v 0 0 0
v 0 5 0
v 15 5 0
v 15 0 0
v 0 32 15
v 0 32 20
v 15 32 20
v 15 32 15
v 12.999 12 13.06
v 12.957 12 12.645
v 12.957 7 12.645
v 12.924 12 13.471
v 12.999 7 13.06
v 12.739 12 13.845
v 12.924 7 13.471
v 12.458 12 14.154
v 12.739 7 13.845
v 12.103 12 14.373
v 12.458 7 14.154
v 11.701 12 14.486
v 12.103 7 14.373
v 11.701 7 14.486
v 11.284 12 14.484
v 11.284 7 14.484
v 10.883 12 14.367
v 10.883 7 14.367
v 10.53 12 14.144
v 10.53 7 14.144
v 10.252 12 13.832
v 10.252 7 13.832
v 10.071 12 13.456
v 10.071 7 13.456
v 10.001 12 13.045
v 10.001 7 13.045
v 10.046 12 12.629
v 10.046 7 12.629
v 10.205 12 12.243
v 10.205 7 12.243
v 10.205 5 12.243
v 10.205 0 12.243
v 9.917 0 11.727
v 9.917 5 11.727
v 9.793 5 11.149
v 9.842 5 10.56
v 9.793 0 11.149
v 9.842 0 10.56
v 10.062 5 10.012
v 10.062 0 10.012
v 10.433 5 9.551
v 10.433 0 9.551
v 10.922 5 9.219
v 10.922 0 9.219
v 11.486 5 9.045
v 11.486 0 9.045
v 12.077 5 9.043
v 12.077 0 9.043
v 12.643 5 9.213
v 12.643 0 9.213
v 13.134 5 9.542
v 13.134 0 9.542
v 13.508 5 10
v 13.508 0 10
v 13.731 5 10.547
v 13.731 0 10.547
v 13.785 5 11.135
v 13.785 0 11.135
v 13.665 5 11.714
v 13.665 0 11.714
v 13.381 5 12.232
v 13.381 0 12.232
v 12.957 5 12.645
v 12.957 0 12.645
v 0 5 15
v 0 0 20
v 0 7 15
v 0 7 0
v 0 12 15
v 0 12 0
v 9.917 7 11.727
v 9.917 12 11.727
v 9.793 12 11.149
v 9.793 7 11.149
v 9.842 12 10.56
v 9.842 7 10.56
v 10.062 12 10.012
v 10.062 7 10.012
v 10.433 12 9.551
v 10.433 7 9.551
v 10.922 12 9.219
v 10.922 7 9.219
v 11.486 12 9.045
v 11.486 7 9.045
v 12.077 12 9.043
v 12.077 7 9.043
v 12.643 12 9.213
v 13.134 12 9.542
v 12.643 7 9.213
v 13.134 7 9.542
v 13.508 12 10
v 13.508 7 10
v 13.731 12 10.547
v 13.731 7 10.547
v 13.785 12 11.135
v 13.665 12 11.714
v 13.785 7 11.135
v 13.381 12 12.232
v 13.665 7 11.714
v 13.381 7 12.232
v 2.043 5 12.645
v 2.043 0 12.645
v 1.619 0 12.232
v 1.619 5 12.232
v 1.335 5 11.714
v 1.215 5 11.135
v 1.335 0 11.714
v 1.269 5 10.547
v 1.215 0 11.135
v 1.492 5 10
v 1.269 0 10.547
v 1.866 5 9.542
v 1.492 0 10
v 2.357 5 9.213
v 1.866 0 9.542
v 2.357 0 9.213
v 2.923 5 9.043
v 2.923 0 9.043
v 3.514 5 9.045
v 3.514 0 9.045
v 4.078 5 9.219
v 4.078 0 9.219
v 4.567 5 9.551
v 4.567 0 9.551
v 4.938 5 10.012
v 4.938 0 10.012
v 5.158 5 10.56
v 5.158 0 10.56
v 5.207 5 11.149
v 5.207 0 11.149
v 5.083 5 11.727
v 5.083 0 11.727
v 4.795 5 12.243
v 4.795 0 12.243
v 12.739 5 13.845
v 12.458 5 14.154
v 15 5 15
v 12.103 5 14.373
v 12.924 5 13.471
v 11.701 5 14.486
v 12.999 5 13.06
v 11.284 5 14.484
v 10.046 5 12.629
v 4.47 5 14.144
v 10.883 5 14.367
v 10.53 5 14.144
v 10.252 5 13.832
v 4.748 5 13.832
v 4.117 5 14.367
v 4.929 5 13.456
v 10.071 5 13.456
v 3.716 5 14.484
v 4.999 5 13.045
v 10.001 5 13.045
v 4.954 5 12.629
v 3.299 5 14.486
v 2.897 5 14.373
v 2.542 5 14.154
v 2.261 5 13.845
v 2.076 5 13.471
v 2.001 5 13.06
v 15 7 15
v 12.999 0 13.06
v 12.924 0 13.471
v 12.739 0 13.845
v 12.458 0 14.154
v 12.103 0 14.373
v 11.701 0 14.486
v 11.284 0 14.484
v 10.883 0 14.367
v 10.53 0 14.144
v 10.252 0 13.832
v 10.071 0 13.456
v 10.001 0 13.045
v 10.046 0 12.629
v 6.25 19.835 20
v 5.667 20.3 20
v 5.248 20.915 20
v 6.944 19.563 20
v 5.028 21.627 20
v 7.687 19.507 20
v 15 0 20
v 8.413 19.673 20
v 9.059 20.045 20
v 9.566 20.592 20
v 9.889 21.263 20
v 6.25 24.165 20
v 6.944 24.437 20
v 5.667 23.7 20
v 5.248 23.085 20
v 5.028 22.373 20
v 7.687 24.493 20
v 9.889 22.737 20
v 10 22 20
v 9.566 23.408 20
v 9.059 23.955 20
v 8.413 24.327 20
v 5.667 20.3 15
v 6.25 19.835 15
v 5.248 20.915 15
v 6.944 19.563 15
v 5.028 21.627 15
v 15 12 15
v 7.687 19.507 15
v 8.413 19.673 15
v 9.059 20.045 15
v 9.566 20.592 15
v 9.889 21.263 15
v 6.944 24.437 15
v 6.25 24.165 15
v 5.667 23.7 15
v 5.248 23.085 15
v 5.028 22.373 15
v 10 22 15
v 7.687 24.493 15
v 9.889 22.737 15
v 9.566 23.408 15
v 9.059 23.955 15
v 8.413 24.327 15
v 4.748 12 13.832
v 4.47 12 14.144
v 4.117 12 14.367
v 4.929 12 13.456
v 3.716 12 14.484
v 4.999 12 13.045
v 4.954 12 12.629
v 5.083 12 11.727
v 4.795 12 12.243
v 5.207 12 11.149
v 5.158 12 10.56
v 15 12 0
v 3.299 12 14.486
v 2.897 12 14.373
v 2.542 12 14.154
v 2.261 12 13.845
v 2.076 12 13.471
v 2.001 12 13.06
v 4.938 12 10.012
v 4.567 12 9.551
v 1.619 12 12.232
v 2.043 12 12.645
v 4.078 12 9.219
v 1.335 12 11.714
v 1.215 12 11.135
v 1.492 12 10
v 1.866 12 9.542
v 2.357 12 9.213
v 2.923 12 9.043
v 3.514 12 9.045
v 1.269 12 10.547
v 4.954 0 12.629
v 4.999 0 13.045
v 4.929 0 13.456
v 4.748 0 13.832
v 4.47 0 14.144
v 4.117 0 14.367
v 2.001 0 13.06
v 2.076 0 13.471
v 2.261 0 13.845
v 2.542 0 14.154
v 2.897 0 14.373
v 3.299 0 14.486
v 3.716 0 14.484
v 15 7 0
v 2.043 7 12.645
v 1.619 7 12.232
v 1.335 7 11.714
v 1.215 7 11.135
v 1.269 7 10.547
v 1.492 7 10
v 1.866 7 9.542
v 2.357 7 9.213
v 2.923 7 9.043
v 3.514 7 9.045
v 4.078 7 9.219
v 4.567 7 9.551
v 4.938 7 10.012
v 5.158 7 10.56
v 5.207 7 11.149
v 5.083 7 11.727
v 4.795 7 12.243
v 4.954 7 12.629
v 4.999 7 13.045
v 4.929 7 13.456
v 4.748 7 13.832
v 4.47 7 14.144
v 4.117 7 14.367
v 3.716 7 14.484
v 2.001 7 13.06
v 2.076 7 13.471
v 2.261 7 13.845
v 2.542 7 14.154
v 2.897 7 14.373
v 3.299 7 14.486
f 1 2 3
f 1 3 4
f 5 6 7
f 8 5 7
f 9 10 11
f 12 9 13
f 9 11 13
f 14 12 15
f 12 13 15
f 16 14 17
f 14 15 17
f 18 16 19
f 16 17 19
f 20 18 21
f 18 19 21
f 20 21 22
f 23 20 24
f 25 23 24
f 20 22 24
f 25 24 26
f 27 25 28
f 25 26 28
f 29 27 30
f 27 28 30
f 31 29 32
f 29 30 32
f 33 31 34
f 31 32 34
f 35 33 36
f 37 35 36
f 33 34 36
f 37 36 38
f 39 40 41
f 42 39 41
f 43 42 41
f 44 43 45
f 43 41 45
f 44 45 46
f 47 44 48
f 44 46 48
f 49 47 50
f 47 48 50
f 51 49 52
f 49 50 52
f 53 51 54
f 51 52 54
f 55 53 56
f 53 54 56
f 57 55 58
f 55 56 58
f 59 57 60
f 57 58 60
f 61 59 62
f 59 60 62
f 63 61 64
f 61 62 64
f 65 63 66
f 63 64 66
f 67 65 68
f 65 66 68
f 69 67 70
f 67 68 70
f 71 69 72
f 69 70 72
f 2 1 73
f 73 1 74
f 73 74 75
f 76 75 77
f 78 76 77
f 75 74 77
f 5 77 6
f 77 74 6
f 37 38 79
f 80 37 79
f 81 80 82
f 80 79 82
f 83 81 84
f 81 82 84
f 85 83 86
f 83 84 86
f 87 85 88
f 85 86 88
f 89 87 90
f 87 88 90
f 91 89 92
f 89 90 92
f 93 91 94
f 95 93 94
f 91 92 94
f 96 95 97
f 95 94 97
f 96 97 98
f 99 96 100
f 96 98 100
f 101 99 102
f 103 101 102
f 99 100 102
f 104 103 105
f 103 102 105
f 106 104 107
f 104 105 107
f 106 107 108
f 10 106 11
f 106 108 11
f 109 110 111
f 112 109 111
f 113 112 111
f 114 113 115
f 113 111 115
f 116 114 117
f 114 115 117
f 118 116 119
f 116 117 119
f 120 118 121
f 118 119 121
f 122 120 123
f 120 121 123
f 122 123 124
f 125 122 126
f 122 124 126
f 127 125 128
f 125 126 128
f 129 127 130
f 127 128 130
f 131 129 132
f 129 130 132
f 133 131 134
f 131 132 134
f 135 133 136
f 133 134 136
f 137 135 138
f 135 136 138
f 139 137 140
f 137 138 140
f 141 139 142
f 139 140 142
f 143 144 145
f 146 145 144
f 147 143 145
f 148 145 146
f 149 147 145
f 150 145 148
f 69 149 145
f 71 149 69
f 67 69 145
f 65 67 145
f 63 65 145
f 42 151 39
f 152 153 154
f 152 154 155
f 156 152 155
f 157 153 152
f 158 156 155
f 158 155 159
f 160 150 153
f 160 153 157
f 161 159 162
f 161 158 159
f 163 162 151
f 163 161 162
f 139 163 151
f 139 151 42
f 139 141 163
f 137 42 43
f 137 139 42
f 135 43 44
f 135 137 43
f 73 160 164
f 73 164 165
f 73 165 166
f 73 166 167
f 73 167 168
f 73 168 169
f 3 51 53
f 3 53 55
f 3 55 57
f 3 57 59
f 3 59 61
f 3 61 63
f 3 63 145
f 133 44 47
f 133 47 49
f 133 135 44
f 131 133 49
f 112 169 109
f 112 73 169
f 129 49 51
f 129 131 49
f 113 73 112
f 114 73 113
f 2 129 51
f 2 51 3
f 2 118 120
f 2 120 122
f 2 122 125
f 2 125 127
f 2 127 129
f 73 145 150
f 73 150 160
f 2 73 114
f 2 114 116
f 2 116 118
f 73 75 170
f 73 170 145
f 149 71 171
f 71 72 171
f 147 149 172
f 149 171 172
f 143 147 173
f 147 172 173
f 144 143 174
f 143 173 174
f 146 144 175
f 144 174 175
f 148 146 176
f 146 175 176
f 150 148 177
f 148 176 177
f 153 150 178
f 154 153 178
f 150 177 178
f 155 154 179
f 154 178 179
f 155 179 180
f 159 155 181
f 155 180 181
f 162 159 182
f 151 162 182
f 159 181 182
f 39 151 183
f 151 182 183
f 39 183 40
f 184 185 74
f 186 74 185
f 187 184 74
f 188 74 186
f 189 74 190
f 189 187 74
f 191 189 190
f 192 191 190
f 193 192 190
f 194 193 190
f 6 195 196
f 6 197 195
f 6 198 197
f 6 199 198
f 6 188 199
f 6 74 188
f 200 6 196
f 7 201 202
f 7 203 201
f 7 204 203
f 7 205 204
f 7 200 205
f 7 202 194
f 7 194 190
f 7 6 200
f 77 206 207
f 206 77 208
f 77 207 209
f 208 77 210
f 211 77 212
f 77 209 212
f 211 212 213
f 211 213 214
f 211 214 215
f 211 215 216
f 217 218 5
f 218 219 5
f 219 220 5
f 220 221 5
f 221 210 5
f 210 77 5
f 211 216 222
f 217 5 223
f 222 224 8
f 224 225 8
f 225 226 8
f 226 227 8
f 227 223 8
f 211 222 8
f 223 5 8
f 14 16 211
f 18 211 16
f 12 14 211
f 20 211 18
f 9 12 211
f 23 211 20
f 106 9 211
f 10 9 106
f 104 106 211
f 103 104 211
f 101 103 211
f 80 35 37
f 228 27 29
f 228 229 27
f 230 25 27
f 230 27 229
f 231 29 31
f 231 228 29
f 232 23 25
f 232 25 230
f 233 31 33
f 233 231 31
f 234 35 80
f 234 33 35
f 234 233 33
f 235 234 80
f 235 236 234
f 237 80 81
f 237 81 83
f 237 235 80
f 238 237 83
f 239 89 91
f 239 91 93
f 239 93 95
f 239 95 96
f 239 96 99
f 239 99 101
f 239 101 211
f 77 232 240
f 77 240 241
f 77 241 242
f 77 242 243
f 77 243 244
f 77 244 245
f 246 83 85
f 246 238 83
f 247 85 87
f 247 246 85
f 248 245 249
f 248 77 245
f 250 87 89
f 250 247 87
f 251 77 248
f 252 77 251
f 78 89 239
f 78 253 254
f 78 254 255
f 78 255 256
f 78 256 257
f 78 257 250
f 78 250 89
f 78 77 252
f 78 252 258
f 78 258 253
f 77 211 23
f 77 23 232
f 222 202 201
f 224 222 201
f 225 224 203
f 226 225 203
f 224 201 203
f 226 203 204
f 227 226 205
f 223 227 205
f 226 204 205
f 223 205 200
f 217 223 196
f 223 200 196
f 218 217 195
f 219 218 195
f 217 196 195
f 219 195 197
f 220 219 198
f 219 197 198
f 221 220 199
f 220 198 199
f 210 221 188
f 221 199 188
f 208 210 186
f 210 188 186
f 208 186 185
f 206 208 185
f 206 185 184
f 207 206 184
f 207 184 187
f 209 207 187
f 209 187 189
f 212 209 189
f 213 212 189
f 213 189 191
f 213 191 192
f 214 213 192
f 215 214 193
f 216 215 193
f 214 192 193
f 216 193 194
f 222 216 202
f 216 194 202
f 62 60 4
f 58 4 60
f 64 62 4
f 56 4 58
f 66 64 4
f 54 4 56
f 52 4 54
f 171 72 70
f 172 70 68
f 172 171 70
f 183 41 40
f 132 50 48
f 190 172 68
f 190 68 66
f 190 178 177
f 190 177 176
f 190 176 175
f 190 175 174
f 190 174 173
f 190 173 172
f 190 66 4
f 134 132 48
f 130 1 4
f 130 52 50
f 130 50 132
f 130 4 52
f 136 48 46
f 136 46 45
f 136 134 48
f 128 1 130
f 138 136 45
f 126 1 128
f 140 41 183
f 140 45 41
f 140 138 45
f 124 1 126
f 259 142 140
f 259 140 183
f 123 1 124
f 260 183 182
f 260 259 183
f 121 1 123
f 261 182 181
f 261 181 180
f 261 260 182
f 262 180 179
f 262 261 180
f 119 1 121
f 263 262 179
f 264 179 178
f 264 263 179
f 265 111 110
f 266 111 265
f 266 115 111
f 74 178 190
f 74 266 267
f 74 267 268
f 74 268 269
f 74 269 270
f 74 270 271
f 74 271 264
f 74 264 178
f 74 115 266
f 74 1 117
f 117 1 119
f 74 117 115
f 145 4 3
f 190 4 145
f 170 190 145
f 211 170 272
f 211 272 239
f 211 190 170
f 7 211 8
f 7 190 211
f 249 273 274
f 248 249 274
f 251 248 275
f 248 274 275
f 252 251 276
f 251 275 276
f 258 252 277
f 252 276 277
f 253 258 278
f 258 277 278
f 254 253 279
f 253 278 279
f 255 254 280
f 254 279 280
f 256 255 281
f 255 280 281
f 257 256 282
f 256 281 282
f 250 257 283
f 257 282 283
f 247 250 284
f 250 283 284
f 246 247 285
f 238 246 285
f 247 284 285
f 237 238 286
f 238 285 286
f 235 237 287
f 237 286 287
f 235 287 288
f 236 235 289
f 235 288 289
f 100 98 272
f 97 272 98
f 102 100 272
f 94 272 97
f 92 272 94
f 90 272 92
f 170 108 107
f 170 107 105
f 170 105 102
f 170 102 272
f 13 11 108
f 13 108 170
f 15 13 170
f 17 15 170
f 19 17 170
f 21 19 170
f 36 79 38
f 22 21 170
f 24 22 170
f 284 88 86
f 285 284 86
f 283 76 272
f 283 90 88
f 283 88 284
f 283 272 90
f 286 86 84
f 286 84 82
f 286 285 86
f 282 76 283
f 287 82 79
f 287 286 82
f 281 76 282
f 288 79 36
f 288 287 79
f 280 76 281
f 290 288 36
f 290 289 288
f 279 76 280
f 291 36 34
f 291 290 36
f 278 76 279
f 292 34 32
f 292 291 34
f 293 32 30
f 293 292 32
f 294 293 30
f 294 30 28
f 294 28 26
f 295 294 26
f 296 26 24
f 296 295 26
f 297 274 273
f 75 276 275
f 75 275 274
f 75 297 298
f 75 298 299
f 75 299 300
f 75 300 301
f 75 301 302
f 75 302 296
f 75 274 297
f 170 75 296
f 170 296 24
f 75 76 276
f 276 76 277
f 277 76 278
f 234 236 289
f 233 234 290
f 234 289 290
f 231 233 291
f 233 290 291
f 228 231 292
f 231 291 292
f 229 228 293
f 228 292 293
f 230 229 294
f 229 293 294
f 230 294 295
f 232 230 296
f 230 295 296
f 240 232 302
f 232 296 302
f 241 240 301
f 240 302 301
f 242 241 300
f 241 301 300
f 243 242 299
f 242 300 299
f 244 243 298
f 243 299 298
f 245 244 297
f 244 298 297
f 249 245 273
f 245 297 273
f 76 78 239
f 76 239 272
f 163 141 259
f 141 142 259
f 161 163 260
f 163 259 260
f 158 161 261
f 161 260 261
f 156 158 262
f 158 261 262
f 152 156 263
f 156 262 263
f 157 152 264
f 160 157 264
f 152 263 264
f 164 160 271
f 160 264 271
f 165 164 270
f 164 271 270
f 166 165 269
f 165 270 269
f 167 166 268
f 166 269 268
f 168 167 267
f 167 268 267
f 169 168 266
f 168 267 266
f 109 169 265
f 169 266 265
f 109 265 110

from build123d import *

# Parameters (mm, degrees)
ESTRUSIONE_ESTRUSIONE1_DEPTH = 15
SCHIZZO5_W                   = 15
SCHIZZO5_H                   = 20
SCHIZZO5_R                   = 2.5
ESTRUSIONE_ESTRUSIONE2_DEPTH = 5
SCHIZZO6_R                   = 2
TAGLIO_ESTRUSIONE2_DEPTH     = 12
SCHIZZO4_R                   = 1.5
TAGLIO_ESTRUSIONE1_DEPTH     = 12


with BuildPart() as part:
    # Schizzo1 → Estrusione-Estrusione1 (new body)
    with BuildSketch(Plane(origin=(0, 0, 0), x_dir=(0, 0, -1), z_dir=(1, 0, 0))):
        Polygon((0, 0), (-20, 0), (-20, 12), (0, 12), (0, 7), (-15, 7), (-15, 5), (0, 5), align=None)
    extrude(amount=ESTRUSIONE_ESTRUSIONE1_DEPTH)

    # Schizzo5 → Estrusione-Estrusione2 (add)
    with BuildSketch(Plane.XY.offset(20)):
        with Locations((7.5, 22)):
            Rectangle(SCHIZZO5_W, SCHIZZO5_H)
        with Locations((7.5, 22)):
            Circle(SCHIZZO5_R, mode=Mode.SUBTRACT)
    extrude(amount=-ESTRUSIONE_ESTRUSIONE2_DEPTH)

    # Schizzo6 → Taglio-Estrusione2 (cut)
    with BuildSketch(Plane.XZ):
        with Locations((3.21150116, 11.021600653)):
            Circle(SCHIZZO6_R)
        with Locations((11.78849884, 11.021600653)):
            Circle(SCHIZZO6_R)
    extrude(amount=-TAGLIO_ESTRUSIONE2_DEPTH, mode=Mode.SUBTRACT)

    # Schizzo4 → Taglio-Estrusione1 (cut)
    with BuildSketch(Plane.XZ):
        with Locations((3.5, 13)):
            Circle(SCHIZZO4_R)
        with Locations((11.5, 13)):
            Circle(SCHIZZO4_R)
    extrude(amount=-TAGLIO_ESTRUSIONE1_DEPTH, mode=Mode.SUBTRACT)


solid = part.part
